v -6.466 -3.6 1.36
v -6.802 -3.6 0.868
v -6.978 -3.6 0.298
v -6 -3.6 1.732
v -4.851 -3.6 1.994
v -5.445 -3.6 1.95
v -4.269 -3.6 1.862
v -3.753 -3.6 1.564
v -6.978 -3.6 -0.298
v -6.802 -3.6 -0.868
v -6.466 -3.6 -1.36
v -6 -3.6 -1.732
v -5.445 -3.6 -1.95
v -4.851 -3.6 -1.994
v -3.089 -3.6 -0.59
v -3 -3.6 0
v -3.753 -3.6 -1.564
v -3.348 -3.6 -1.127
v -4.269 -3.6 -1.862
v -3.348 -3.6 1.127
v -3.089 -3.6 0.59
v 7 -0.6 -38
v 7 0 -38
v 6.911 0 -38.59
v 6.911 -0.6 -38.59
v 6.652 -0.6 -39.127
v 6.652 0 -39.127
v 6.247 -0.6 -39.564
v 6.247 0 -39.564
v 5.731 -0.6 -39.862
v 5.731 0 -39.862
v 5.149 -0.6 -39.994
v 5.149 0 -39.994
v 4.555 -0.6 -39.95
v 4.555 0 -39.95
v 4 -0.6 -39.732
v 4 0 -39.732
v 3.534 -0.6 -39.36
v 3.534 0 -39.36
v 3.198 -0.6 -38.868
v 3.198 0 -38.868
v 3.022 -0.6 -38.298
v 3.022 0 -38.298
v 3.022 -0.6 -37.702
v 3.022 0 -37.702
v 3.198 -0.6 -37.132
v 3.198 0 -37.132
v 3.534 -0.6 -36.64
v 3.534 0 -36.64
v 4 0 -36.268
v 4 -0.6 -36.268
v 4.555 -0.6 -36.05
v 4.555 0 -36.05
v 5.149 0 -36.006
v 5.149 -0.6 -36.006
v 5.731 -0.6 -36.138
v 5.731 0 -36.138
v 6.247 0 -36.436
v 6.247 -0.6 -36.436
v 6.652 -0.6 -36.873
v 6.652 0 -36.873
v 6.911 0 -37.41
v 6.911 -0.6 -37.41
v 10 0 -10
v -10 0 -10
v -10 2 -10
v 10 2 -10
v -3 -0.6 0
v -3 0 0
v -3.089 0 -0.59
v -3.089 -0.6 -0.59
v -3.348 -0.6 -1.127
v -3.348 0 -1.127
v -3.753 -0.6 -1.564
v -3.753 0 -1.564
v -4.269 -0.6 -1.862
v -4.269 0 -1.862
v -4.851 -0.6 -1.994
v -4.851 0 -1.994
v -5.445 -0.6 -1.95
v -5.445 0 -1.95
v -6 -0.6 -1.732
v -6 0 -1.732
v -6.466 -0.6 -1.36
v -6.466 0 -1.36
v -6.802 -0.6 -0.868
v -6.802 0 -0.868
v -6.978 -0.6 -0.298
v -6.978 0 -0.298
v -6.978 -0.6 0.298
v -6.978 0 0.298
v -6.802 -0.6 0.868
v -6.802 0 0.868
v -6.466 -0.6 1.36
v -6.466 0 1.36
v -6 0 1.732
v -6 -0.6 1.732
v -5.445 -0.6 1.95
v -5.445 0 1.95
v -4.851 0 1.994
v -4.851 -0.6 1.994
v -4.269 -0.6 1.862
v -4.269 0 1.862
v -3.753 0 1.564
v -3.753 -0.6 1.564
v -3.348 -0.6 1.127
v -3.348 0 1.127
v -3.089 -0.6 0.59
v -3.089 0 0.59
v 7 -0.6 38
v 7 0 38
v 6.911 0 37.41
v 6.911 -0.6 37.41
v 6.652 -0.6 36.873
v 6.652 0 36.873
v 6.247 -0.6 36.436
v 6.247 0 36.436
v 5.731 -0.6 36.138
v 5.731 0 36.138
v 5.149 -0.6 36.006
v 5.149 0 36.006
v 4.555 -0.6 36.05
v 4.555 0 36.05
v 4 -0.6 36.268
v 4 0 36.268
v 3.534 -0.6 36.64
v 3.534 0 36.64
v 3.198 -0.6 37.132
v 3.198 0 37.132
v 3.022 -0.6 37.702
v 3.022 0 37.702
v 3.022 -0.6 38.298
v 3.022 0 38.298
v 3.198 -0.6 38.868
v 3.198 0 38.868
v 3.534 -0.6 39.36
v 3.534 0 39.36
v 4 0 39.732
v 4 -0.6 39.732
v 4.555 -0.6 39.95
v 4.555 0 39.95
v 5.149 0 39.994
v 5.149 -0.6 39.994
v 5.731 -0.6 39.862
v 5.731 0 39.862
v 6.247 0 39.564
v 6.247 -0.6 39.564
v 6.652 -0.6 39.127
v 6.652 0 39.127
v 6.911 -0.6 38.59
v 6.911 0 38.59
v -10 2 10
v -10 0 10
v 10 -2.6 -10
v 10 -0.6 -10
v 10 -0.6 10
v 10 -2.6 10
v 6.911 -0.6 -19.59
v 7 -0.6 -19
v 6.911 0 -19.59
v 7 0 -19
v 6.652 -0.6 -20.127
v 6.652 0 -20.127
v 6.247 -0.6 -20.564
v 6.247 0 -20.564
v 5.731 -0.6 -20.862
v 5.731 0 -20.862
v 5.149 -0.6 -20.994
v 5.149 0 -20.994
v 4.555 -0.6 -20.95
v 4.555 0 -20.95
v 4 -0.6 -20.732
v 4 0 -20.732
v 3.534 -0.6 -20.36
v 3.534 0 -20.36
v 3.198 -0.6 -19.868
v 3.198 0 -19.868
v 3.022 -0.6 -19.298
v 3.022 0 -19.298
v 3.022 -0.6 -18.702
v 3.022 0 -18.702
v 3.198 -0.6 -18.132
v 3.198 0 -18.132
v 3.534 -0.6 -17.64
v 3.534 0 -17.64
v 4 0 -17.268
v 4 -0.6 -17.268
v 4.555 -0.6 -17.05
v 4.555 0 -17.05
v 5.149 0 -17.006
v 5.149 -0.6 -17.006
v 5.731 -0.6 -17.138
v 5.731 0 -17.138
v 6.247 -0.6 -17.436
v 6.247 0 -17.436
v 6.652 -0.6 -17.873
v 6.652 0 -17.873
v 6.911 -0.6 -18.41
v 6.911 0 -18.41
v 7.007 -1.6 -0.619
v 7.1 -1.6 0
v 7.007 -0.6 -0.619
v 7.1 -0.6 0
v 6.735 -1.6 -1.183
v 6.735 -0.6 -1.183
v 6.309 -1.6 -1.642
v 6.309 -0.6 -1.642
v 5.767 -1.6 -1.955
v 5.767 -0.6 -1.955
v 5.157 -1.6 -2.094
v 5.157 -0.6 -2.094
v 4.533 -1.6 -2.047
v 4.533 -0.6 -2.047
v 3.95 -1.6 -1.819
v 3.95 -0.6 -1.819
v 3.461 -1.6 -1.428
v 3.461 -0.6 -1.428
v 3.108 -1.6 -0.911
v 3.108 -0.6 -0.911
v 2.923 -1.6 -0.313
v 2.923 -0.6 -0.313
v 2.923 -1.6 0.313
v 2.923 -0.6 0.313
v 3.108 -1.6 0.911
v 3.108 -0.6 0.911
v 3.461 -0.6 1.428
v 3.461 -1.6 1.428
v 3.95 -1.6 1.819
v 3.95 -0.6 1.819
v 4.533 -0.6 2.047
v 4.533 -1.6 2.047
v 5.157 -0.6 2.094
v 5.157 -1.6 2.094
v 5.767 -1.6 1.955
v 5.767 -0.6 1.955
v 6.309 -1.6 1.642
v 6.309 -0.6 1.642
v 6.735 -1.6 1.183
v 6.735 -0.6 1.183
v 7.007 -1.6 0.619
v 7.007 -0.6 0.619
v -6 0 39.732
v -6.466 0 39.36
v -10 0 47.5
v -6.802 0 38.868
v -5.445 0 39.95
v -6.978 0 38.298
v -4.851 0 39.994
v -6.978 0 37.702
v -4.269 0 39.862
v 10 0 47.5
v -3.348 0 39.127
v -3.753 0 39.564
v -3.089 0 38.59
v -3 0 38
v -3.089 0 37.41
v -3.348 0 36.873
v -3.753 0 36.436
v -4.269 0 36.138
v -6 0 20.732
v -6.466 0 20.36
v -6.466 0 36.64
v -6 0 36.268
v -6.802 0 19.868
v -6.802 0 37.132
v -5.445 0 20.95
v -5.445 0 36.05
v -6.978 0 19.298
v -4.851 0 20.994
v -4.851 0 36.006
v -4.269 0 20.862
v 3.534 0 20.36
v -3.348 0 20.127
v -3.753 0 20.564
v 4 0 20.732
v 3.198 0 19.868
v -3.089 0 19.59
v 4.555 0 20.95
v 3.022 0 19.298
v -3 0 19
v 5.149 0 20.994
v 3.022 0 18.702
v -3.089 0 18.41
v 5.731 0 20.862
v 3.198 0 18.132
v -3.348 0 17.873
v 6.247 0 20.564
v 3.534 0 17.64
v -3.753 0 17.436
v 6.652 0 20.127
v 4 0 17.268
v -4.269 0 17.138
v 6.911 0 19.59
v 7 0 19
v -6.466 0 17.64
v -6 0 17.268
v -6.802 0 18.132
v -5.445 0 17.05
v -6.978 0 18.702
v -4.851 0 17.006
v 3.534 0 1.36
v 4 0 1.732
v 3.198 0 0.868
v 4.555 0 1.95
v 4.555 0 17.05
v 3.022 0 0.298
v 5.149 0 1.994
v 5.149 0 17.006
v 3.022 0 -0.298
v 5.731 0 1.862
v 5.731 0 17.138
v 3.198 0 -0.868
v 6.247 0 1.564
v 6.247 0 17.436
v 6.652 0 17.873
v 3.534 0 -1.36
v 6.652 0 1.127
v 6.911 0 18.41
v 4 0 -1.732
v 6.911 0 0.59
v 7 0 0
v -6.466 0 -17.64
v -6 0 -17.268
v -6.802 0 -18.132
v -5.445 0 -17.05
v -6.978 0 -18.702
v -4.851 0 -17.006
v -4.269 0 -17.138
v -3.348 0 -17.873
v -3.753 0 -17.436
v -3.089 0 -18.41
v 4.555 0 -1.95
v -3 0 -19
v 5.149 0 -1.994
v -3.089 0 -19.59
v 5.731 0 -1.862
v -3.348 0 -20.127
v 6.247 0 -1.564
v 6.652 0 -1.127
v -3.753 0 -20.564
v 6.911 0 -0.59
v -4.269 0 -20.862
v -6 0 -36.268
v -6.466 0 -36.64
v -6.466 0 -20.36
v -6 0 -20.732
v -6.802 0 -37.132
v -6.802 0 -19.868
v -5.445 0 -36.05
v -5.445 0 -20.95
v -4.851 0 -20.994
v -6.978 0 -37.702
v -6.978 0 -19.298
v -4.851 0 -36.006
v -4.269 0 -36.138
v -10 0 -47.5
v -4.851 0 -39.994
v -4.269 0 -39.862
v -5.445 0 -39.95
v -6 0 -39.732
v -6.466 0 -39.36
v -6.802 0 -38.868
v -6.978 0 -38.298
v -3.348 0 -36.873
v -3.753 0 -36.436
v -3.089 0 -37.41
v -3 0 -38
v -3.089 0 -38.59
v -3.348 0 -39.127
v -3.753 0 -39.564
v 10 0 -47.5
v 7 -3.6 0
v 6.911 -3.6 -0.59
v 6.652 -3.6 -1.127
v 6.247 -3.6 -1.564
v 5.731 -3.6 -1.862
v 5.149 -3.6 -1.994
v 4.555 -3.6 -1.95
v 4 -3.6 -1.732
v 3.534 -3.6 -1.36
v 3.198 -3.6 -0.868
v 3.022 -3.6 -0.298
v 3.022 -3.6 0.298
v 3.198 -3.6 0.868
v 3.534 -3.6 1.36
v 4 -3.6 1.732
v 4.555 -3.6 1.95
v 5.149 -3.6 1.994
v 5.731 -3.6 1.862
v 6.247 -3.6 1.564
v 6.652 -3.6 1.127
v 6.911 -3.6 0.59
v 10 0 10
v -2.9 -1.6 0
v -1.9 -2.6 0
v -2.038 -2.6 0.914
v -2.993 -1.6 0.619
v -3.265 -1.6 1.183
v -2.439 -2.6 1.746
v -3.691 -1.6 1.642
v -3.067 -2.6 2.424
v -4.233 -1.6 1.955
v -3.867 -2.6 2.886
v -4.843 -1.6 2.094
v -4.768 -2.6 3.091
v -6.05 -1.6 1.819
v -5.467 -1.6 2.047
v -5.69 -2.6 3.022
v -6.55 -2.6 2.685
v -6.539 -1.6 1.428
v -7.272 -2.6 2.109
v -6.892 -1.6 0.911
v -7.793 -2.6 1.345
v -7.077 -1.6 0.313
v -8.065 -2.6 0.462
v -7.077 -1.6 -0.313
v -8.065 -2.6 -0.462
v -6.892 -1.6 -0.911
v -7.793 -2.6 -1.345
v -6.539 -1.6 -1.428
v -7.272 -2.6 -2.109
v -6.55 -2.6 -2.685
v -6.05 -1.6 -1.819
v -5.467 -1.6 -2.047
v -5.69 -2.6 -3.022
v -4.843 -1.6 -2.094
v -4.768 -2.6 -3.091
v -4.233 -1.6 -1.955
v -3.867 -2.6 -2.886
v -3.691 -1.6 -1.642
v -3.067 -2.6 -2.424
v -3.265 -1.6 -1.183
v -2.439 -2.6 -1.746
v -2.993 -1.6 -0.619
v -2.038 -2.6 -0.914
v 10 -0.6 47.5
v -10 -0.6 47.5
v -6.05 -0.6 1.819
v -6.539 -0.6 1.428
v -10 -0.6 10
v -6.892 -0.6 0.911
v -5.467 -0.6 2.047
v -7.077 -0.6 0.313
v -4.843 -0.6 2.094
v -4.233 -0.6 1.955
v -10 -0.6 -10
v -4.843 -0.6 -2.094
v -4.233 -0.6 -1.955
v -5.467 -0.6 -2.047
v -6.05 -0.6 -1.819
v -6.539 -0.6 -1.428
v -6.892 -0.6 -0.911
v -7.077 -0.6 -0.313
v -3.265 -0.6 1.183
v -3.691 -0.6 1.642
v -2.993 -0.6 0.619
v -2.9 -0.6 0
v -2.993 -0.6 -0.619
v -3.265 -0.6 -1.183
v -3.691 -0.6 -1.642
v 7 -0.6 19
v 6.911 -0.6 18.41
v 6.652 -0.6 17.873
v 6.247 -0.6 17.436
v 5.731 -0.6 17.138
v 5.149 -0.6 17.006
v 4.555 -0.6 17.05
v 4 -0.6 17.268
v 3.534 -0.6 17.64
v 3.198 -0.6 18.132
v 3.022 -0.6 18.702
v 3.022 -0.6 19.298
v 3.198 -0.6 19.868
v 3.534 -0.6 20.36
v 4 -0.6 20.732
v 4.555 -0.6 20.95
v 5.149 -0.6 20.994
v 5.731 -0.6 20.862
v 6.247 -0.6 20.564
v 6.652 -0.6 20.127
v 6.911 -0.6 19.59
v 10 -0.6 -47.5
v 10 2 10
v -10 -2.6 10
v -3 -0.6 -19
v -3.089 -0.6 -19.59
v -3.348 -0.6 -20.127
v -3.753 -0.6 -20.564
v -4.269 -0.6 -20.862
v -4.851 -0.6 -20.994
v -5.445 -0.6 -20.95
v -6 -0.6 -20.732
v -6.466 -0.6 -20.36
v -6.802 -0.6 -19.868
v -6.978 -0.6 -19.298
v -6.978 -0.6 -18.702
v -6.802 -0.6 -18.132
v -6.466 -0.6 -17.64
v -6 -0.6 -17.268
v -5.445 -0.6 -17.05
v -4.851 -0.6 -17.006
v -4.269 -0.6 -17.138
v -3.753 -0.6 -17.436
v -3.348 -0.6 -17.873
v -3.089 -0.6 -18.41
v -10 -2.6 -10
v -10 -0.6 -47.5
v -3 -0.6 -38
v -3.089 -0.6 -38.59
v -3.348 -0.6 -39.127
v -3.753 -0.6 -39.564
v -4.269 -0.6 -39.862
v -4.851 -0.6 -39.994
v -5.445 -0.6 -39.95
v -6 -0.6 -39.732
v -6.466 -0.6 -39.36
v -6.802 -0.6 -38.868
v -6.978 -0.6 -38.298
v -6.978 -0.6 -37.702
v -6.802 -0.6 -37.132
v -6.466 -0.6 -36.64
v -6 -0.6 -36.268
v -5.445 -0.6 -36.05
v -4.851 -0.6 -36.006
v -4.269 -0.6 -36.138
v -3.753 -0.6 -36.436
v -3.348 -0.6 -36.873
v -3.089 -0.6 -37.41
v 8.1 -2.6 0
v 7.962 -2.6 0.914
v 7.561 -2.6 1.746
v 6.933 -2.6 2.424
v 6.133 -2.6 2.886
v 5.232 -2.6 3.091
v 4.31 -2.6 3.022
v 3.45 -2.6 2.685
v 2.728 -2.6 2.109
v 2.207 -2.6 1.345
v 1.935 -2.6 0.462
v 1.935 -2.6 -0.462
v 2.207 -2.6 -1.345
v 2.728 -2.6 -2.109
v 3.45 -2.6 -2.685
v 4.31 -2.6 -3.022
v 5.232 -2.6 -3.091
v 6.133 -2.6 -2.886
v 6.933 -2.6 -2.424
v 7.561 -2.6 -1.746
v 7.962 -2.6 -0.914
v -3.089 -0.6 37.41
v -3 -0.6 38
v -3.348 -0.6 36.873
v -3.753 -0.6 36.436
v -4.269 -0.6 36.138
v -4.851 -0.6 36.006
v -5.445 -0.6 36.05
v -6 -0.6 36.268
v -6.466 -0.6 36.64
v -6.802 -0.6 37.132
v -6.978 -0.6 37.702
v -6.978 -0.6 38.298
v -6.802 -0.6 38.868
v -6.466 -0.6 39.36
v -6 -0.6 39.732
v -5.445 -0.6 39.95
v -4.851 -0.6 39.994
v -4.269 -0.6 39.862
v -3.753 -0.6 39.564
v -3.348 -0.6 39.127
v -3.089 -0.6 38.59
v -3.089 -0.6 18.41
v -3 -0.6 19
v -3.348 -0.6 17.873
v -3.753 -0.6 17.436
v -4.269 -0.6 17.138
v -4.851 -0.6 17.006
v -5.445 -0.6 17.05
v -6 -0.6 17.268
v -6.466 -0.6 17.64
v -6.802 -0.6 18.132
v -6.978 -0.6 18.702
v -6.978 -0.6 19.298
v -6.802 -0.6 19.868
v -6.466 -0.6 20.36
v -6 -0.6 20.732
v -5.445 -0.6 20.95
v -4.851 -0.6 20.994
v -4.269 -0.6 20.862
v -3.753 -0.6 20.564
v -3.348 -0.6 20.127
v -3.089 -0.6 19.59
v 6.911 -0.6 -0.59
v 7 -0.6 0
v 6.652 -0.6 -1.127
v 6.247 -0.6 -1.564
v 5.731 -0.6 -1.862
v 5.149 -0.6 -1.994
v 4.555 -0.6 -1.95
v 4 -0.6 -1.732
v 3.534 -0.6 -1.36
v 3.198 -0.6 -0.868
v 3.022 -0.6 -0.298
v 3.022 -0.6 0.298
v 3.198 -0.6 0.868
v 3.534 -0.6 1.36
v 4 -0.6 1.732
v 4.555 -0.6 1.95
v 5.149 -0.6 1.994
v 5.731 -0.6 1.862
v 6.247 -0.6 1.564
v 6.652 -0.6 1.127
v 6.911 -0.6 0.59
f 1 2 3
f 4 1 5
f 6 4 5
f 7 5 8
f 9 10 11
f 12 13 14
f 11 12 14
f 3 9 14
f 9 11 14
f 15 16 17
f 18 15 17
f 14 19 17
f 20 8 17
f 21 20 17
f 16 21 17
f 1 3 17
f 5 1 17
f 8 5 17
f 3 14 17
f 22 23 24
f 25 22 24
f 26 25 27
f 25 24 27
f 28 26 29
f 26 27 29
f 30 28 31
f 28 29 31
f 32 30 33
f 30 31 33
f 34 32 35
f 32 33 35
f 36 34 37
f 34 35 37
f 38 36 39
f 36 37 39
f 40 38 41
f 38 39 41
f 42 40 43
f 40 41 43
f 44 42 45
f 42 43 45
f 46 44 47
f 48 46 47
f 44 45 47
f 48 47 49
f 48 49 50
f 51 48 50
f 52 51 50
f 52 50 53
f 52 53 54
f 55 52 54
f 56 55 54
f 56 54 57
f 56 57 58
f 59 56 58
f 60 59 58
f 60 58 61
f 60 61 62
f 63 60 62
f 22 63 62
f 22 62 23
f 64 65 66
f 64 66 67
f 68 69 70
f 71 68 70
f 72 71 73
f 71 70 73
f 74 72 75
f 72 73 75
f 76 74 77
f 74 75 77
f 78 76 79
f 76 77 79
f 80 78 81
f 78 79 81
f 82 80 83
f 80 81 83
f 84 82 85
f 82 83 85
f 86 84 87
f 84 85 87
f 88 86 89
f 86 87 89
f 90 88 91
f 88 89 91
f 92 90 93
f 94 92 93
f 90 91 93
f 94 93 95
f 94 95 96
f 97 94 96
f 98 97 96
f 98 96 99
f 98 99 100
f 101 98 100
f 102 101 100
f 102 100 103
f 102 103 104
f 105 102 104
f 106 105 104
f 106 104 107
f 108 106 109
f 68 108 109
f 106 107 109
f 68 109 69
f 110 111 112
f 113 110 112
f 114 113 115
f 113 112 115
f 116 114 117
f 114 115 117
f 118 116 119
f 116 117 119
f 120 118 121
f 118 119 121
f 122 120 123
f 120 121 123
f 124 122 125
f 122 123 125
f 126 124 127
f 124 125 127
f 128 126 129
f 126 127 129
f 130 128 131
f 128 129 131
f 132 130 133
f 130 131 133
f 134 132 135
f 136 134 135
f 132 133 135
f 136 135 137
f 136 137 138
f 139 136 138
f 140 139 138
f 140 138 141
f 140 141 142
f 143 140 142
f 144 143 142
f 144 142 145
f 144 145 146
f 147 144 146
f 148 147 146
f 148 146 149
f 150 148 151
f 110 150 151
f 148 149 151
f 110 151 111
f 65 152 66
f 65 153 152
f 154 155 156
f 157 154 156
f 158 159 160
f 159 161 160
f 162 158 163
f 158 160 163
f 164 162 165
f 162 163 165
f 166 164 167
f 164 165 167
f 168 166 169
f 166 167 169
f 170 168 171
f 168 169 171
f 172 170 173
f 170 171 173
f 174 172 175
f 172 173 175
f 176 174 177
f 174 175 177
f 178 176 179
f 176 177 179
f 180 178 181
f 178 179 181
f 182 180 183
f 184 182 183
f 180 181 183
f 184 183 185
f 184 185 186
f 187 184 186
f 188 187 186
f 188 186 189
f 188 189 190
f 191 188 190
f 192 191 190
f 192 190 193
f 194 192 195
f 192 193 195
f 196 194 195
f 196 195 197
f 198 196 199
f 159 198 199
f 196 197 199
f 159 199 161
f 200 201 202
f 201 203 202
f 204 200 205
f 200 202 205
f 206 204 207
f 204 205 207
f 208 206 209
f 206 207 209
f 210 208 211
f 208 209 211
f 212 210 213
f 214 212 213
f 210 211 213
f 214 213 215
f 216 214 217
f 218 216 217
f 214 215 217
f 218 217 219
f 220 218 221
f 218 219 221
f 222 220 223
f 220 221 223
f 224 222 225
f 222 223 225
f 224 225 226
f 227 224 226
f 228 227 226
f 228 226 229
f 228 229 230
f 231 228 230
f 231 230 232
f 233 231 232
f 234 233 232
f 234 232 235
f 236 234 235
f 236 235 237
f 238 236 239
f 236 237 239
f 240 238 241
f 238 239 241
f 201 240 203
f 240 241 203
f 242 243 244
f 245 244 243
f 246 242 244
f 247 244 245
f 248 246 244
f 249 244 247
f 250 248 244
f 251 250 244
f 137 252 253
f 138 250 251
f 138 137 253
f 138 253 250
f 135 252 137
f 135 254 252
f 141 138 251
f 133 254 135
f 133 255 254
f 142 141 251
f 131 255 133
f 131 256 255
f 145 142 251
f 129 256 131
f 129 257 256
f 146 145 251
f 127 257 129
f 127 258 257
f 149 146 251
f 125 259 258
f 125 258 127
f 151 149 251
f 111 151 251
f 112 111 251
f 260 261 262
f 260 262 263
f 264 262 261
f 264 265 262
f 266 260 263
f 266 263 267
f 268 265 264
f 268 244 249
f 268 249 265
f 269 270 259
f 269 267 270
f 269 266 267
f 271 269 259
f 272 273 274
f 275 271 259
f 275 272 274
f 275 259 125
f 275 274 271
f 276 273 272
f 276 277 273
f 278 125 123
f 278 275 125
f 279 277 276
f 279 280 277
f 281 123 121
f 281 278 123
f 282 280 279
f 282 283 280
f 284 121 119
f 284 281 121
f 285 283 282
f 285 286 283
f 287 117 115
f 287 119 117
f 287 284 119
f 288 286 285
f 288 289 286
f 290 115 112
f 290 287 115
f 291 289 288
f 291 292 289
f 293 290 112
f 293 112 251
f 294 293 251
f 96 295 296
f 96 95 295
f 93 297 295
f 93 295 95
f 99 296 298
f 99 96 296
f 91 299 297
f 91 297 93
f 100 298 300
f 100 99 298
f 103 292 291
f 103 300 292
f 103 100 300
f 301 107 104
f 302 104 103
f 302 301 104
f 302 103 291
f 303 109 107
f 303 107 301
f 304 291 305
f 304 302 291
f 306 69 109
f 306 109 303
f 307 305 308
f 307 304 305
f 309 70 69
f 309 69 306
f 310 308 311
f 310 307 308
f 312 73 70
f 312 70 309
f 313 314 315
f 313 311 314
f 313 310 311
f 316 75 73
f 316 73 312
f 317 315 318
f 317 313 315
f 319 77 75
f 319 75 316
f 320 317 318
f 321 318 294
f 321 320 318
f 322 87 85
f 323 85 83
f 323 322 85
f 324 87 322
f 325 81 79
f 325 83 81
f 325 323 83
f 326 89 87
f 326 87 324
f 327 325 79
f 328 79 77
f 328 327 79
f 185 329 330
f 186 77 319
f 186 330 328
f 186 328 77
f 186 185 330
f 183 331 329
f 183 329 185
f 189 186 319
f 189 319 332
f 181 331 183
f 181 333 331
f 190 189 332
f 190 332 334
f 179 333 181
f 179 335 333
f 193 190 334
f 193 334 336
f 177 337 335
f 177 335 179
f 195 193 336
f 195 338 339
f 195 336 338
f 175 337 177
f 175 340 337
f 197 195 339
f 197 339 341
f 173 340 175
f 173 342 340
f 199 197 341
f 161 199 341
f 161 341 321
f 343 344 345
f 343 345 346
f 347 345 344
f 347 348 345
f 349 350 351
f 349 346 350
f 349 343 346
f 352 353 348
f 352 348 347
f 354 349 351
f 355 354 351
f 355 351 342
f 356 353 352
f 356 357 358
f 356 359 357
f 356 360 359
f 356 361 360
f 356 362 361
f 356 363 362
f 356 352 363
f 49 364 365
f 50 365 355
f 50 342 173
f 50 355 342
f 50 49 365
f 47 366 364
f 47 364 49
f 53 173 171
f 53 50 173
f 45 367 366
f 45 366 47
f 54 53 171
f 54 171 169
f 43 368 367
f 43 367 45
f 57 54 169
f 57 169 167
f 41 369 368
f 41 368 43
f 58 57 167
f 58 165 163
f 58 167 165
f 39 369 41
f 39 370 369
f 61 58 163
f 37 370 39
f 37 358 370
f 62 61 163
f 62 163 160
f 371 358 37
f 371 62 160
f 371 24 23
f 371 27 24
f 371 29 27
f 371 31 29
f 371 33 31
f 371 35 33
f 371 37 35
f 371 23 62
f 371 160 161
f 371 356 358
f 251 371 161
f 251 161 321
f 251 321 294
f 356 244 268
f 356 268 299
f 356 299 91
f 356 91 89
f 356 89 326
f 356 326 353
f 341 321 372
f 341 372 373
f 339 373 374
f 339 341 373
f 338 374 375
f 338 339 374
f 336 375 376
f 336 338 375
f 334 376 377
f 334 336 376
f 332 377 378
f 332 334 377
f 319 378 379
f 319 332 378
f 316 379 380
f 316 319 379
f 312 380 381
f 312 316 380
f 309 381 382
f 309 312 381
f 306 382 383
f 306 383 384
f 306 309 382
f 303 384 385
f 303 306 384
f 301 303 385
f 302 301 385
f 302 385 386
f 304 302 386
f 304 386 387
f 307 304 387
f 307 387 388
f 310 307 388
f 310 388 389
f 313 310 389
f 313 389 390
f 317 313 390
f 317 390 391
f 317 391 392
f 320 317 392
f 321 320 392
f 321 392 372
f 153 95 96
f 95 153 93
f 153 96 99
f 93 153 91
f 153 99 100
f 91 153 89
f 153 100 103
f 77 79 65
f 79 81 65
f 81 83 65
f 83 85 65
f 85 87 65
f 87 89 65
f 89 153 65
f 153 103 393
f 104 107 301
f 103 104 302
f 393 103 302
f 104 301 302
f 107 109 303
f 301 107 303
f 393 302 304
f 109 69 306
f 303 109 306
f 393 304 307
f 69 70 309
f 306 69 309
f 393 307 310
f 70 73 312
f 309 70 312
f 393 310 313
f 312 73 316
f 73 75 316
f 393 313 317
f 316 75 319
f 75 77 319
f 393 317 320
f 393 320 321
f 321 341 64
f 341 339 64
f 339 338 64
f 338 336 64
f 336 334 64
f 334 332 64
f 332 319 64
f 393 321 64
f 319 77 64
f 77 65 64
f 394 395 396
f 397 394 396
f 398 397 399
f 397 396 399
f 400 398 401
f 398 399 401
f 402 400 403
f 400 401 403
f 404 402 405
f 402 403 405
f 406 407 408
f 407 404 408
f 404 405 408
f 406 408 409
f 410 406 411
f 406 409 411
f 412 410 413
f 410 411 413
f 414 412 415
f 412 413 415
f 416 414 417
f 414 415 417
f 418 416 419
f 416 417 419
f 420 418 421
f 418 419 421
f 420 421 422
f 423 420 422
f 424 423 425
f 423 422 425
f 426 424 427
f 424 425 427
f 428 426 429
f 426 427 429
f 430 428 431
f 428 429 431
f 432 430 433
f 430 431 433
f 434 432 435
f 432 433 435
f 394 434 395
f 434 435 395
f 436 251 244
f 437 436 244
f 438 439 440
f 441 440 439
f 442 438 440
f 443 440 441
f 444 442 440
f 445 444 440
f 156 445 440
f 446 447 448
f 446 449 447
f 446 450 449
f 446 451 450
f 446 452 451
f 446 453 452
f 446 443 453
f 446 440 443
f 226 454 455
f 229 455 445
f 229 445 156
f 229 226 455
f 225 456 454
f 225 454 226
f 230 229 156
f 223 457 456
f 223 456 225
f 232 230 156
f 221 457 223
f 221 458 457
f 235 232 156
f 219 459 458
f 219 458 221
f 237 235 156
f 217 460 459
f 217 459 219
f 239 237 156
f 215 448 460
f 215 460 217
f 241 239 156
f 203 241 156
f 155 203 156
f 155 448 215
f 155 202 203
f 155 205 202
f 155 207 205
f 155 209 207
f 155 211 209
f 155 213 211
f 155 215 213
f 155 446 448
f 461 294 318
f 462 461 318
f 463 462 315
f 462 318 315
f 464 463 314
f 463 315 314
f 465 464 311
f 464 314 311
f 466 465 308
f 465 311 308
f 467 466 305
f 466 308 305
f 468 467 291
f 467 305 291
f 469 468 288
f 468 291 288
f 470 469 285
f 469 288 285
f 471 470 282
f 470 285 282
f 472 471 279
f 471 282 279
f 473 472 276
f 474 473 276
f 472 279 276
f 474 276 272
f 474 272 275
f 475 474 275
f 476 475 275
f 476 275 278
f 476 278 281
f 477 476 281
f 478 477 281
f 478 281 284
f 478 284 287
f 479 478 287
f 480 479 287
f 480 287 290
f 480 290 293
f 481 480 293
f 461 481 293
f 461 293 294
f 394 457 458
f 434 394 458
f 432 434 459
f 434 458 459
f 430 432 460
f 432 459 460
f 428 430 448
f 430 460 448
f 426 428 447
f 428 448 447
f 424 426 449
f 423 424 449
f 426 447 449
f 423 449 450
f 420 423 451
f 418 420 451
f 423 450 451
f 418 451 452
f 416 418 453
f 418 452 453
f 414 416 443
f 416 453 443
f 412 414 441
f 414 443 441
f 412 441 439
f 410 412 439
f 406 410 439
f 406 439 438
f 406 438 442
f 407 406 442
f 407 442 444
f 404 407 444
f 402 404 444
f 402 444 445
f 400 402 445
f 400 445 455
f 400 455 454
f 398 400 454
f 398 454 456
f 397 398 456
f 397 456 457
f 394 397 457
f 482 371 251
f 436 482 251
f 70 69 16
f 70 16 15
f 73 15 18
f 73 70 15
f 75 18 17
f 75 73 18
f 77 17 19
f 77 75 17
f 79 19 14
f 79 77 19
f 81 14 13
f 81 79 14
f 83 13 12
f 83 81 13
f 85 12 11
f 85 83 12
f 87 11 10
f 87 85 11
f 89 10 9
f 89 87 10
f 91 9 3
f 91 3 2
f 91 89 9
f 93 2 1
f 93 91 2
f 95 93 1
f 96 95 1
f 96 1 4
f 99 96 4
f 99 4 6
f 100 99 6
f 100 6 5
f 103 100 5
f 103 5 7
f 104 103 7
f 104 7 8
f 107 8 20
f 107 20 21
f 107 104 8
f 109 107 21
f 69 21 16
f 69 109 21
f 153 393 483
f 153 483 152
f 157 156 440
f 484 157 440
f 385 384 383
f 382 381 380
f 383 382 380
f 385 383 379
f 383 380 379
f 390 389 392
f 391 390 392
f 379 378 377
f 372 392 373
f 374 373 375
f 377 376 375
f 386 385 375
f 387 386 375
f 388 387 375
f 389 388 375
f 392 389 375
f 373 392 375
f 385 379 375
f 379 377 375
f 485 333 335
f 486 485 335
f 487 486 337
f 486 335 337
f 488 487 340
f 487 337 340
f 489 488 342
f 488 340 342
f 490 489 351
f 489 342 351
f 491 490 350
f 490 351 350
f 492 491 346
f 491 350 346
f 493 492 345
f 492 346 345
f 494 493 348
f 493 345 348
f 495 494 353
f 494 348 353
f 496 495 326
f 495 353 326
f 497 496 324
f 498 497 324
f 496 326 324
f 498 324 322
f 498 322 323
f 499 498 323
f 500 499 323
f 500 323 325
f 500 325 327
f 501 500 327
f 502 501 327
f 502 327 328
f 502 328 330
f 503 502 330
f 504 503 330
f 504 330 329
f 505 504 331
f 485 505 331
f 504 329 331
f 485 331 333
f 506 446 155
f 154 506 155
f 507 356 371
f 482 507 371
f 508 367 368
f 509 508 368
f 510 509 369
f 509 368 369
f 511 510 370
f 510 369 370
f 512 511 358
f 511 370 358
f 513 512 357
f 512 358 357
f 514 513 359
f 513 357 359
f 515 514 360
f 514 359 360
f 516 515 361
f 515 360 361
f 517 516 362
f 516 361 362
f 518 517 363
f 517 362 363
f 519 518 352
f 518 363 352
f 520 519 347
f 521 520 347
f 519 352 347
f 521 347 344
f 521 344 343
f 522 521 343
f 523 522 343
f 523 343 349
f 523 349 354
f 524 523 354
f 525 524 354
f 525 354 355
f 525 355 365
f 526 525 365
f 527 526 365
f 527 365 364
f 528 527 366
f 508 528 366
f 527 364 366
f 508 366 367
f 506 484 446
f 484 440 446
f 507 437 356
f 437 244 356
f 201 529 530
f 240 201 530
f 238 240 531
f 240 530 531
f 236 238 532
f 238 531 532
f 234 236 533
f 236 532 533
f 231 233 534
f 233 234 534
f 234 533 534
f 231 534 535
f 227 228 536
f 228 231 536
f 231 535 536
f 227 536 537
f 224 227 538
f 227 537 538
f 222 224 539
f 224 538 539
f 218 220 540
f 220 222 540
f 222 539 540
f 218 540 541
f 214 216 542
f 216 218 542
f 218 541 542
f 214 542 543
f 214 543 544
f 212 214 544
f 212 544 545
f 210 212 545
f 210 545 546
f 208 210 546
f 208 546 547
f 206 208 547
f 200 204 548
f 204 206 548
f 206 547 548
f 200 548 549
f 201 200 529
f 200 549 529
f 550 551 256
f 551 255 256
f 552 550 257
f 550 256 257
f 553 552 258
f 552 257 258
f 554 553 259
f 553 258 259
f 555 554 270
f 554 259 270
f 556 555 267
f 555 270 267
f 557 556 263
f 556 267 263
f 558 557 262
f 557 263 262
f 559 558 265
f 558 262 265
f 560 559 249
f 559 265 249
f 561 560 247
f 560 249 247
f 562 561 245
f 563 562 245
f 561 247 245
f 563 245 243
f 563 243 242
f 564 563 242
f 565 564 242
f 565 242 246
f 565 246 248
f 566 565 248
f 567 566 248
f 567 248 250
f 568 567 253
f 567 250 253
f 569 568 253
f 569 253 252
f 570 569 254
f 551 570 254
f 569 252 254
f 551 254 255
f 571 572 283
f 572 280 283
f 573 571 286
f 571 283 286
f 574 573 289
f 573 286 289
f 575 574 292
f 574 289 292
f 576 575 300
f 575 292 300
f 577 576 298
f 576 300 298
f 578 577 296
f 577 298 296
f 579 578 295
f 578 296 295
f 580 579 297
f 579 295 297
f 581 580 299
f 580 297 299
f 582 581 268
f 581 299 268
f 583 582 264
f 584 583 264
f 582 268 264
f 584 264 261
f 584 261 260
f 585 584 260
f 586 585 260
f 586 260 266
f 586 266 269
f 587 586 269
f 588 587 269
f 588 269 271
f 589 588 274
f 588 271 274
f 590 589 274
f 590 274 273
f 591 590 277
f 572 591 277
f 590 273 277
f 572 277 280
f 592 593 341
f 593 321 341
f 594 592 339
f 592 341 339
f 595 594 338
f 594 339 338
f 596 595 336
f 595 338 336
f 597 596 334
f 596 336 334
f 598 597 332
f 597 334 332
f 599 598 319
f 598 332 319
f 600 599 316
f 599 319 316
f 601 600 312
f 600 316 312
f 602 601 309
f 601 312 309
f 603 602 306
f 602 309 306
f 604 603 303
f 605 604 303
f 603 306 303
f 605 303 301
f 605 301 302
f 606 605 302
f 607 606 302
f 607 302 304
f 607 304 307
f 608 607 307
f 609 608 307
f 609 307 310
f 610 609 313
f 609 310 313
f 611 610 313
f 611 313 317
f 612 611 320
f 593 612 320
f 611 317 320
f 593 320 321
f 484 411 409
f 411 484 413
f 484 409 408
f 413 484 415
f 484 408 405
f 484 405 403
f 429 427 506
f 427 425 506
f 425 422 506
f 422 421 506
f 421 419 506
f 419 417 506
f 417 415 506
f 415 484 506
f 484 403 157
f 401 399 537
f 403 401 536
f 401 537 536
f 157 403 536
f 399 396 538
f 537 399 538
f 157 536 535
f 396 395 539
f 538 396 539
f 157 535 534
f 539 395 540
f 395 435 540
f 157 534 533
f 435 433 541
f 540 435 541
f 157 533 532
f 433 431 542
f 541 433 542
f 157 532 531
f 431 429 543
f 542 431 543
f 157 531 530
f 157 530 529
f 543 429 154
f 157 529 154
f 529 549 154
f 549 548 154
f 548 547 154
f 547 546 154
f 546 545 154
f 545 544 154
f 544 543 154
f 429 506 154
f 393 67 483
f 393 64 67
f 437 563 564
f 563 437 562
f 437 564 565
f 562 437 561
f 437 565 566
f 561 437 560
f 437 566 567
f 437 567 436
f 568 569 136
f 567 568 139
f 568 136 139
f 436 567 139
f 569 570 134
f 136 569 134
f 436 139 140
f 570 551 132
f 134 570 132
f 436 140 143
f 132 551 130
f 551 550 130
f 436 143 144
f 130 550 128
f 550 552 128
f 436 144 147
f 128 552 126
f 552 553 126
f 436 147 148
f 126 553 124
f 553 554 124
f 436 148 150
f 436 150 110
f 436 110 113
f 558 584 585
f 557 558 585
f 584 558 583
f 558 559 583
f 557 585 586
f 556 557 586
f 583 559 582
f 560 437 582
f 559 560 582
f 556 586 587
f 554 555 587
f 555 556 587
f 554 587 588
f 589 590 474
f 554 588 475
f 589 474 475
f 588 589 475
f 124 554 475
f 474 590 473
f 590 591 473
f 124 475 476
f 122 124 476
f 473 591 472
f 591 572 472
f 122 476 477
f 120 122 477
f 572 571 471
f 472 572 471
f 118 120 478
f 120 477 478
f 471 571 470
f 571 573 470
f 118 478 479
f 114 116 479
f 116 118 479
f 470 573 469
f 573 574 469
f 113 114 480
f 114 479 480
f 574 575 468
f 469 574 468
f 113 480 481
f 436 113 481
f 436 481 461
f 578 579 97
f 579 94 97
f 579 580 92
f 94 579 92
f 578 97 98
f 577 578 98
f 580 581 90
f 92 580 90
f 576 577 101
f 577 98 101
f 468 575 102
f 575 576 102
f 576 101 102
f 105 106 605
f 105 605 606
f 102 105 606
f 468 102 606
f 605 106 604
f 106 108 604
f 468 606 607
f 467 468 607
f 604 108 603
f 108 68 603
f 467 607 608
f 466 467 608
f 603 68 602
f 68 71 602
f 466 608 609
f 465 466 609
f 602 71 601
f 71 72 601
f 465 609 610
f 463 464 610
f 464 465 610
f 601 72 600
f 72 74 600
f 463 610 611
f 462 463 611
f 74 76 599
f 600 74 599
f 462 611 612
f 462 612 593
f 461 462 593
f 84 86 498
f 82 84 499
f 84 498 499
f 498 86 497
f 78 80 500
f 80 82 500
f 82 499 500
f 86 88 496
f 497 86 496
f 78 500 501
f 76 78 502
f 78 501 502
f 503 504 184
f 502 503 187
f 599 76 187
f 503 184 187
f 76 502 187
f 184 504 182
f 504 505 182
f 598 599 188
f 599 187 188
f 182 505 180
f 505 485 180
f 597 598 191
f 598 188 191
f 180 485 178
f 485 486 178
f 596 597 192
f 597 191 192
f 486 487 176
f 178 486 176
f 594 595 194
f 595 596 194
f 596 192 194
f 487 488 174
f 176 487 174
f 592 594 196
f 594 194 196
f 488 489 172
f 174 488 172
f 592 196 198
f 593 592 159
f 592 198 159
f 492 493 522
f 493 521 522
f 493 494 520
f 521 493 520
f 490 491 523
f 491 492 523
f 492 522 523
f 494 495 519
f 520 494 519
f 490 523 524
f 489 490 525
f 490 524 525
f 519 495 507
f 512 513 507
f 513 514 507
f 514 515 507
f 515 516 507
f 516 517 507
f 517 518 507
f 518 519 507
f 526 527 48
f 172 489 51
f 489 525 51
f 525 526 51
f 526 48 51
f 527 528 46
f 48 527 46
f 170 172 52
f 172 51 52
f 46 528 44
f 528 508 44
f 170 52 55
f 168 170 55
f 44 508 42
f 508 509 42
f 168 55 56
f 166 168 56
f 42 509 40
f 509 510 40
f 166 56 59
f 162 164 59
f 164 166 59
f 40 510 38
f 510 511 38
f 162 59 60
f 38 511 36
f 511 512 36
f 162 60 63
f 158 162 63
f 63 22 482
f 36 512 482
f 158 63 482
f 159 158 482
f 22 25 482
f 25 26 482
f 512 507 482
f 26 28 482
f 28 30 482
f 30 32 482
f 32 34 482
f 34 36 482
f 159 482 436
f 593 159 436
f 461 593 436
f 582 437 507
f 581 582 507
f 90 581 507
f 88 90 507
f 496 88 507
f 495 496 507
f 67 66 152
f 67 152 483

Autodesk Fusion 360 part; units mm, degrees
sketch "Sketch1" plane through (0, 0, 0) normal (0, 1, 0) x (1, 0, 0)
  line L0 (10, -10) -> (-10, -10)
  line L1 (-10, -10) -> (-10, 10)
  line L2 (-10, 10) -> (10, 10)
  line L3 (10, 10) -> (10, -10)
  line L4 (10, -10) -> (-10, 10) construction
  line L5 (-10, -10) -> (10, 10) construction
  line L6 (0, 0) -> (47.3692, 0) construction
  line L7 (47.3692, 0) -> (-74.5254, 0) construction
  circle A0 centre (5, 0) radius 2
  line L8 (0, -20) -> (0, -2.5)
  circle A1 centre (-5, 0) radius 2
  dimension "d1" = 20
  dimension "d2" = 20
  dimension "d3" = 4
  dimension "d4" = 5
extrude "Extrude1" add sketch "Sketch1" along normal blind 2 contours L0 L1 L2 L3 | A0 | A1 makes body 1
extrude "Extrude2" add sketch "Sketch1" against normal blind 0.6 separate body makes body 2
extrude "Extrude3" add sketch "Sketch1" against normal blind 2 from surface at -0.6 separate body makes body 3
move_face "OffsetFaces1" offset -0.1 2 faces at (6.9901, -1.2667, 0.1991) (-3.0099, -1.2667, 0.1991) on bodies 3
chamfer "Chamfer1" distance 1 angle 45 2 edges at (3.0421, -2.6, 0.7594) (-6.9579, -2.6, 0.7594) on bodies 3
extrude "Extrude4" add sketch "Sketch1" against normal blind 3.6 contours A0 | A1 bodies 1
move_face "OffsetFaces2" offset -0.5 2 faces at (6.6667, -0.4, 10) (-3.3333, -0.2, -10) on bodies 2
pattern_linear "R-Pattern1" count 5 spacing 19 along (0, 0, 1) both ways of bodies 2 makes body 4 at (-1.4231, 0, -44.9539) makes body 5 at (-1.4231, 0, -25.9539) makes body 6 at (-1.4231, 0, 12.0461) makes body 7 at (-1.4231, 0, 31.0461)
combine "Combine1" operation add target body 2 tool bodies 7 6 5 4
